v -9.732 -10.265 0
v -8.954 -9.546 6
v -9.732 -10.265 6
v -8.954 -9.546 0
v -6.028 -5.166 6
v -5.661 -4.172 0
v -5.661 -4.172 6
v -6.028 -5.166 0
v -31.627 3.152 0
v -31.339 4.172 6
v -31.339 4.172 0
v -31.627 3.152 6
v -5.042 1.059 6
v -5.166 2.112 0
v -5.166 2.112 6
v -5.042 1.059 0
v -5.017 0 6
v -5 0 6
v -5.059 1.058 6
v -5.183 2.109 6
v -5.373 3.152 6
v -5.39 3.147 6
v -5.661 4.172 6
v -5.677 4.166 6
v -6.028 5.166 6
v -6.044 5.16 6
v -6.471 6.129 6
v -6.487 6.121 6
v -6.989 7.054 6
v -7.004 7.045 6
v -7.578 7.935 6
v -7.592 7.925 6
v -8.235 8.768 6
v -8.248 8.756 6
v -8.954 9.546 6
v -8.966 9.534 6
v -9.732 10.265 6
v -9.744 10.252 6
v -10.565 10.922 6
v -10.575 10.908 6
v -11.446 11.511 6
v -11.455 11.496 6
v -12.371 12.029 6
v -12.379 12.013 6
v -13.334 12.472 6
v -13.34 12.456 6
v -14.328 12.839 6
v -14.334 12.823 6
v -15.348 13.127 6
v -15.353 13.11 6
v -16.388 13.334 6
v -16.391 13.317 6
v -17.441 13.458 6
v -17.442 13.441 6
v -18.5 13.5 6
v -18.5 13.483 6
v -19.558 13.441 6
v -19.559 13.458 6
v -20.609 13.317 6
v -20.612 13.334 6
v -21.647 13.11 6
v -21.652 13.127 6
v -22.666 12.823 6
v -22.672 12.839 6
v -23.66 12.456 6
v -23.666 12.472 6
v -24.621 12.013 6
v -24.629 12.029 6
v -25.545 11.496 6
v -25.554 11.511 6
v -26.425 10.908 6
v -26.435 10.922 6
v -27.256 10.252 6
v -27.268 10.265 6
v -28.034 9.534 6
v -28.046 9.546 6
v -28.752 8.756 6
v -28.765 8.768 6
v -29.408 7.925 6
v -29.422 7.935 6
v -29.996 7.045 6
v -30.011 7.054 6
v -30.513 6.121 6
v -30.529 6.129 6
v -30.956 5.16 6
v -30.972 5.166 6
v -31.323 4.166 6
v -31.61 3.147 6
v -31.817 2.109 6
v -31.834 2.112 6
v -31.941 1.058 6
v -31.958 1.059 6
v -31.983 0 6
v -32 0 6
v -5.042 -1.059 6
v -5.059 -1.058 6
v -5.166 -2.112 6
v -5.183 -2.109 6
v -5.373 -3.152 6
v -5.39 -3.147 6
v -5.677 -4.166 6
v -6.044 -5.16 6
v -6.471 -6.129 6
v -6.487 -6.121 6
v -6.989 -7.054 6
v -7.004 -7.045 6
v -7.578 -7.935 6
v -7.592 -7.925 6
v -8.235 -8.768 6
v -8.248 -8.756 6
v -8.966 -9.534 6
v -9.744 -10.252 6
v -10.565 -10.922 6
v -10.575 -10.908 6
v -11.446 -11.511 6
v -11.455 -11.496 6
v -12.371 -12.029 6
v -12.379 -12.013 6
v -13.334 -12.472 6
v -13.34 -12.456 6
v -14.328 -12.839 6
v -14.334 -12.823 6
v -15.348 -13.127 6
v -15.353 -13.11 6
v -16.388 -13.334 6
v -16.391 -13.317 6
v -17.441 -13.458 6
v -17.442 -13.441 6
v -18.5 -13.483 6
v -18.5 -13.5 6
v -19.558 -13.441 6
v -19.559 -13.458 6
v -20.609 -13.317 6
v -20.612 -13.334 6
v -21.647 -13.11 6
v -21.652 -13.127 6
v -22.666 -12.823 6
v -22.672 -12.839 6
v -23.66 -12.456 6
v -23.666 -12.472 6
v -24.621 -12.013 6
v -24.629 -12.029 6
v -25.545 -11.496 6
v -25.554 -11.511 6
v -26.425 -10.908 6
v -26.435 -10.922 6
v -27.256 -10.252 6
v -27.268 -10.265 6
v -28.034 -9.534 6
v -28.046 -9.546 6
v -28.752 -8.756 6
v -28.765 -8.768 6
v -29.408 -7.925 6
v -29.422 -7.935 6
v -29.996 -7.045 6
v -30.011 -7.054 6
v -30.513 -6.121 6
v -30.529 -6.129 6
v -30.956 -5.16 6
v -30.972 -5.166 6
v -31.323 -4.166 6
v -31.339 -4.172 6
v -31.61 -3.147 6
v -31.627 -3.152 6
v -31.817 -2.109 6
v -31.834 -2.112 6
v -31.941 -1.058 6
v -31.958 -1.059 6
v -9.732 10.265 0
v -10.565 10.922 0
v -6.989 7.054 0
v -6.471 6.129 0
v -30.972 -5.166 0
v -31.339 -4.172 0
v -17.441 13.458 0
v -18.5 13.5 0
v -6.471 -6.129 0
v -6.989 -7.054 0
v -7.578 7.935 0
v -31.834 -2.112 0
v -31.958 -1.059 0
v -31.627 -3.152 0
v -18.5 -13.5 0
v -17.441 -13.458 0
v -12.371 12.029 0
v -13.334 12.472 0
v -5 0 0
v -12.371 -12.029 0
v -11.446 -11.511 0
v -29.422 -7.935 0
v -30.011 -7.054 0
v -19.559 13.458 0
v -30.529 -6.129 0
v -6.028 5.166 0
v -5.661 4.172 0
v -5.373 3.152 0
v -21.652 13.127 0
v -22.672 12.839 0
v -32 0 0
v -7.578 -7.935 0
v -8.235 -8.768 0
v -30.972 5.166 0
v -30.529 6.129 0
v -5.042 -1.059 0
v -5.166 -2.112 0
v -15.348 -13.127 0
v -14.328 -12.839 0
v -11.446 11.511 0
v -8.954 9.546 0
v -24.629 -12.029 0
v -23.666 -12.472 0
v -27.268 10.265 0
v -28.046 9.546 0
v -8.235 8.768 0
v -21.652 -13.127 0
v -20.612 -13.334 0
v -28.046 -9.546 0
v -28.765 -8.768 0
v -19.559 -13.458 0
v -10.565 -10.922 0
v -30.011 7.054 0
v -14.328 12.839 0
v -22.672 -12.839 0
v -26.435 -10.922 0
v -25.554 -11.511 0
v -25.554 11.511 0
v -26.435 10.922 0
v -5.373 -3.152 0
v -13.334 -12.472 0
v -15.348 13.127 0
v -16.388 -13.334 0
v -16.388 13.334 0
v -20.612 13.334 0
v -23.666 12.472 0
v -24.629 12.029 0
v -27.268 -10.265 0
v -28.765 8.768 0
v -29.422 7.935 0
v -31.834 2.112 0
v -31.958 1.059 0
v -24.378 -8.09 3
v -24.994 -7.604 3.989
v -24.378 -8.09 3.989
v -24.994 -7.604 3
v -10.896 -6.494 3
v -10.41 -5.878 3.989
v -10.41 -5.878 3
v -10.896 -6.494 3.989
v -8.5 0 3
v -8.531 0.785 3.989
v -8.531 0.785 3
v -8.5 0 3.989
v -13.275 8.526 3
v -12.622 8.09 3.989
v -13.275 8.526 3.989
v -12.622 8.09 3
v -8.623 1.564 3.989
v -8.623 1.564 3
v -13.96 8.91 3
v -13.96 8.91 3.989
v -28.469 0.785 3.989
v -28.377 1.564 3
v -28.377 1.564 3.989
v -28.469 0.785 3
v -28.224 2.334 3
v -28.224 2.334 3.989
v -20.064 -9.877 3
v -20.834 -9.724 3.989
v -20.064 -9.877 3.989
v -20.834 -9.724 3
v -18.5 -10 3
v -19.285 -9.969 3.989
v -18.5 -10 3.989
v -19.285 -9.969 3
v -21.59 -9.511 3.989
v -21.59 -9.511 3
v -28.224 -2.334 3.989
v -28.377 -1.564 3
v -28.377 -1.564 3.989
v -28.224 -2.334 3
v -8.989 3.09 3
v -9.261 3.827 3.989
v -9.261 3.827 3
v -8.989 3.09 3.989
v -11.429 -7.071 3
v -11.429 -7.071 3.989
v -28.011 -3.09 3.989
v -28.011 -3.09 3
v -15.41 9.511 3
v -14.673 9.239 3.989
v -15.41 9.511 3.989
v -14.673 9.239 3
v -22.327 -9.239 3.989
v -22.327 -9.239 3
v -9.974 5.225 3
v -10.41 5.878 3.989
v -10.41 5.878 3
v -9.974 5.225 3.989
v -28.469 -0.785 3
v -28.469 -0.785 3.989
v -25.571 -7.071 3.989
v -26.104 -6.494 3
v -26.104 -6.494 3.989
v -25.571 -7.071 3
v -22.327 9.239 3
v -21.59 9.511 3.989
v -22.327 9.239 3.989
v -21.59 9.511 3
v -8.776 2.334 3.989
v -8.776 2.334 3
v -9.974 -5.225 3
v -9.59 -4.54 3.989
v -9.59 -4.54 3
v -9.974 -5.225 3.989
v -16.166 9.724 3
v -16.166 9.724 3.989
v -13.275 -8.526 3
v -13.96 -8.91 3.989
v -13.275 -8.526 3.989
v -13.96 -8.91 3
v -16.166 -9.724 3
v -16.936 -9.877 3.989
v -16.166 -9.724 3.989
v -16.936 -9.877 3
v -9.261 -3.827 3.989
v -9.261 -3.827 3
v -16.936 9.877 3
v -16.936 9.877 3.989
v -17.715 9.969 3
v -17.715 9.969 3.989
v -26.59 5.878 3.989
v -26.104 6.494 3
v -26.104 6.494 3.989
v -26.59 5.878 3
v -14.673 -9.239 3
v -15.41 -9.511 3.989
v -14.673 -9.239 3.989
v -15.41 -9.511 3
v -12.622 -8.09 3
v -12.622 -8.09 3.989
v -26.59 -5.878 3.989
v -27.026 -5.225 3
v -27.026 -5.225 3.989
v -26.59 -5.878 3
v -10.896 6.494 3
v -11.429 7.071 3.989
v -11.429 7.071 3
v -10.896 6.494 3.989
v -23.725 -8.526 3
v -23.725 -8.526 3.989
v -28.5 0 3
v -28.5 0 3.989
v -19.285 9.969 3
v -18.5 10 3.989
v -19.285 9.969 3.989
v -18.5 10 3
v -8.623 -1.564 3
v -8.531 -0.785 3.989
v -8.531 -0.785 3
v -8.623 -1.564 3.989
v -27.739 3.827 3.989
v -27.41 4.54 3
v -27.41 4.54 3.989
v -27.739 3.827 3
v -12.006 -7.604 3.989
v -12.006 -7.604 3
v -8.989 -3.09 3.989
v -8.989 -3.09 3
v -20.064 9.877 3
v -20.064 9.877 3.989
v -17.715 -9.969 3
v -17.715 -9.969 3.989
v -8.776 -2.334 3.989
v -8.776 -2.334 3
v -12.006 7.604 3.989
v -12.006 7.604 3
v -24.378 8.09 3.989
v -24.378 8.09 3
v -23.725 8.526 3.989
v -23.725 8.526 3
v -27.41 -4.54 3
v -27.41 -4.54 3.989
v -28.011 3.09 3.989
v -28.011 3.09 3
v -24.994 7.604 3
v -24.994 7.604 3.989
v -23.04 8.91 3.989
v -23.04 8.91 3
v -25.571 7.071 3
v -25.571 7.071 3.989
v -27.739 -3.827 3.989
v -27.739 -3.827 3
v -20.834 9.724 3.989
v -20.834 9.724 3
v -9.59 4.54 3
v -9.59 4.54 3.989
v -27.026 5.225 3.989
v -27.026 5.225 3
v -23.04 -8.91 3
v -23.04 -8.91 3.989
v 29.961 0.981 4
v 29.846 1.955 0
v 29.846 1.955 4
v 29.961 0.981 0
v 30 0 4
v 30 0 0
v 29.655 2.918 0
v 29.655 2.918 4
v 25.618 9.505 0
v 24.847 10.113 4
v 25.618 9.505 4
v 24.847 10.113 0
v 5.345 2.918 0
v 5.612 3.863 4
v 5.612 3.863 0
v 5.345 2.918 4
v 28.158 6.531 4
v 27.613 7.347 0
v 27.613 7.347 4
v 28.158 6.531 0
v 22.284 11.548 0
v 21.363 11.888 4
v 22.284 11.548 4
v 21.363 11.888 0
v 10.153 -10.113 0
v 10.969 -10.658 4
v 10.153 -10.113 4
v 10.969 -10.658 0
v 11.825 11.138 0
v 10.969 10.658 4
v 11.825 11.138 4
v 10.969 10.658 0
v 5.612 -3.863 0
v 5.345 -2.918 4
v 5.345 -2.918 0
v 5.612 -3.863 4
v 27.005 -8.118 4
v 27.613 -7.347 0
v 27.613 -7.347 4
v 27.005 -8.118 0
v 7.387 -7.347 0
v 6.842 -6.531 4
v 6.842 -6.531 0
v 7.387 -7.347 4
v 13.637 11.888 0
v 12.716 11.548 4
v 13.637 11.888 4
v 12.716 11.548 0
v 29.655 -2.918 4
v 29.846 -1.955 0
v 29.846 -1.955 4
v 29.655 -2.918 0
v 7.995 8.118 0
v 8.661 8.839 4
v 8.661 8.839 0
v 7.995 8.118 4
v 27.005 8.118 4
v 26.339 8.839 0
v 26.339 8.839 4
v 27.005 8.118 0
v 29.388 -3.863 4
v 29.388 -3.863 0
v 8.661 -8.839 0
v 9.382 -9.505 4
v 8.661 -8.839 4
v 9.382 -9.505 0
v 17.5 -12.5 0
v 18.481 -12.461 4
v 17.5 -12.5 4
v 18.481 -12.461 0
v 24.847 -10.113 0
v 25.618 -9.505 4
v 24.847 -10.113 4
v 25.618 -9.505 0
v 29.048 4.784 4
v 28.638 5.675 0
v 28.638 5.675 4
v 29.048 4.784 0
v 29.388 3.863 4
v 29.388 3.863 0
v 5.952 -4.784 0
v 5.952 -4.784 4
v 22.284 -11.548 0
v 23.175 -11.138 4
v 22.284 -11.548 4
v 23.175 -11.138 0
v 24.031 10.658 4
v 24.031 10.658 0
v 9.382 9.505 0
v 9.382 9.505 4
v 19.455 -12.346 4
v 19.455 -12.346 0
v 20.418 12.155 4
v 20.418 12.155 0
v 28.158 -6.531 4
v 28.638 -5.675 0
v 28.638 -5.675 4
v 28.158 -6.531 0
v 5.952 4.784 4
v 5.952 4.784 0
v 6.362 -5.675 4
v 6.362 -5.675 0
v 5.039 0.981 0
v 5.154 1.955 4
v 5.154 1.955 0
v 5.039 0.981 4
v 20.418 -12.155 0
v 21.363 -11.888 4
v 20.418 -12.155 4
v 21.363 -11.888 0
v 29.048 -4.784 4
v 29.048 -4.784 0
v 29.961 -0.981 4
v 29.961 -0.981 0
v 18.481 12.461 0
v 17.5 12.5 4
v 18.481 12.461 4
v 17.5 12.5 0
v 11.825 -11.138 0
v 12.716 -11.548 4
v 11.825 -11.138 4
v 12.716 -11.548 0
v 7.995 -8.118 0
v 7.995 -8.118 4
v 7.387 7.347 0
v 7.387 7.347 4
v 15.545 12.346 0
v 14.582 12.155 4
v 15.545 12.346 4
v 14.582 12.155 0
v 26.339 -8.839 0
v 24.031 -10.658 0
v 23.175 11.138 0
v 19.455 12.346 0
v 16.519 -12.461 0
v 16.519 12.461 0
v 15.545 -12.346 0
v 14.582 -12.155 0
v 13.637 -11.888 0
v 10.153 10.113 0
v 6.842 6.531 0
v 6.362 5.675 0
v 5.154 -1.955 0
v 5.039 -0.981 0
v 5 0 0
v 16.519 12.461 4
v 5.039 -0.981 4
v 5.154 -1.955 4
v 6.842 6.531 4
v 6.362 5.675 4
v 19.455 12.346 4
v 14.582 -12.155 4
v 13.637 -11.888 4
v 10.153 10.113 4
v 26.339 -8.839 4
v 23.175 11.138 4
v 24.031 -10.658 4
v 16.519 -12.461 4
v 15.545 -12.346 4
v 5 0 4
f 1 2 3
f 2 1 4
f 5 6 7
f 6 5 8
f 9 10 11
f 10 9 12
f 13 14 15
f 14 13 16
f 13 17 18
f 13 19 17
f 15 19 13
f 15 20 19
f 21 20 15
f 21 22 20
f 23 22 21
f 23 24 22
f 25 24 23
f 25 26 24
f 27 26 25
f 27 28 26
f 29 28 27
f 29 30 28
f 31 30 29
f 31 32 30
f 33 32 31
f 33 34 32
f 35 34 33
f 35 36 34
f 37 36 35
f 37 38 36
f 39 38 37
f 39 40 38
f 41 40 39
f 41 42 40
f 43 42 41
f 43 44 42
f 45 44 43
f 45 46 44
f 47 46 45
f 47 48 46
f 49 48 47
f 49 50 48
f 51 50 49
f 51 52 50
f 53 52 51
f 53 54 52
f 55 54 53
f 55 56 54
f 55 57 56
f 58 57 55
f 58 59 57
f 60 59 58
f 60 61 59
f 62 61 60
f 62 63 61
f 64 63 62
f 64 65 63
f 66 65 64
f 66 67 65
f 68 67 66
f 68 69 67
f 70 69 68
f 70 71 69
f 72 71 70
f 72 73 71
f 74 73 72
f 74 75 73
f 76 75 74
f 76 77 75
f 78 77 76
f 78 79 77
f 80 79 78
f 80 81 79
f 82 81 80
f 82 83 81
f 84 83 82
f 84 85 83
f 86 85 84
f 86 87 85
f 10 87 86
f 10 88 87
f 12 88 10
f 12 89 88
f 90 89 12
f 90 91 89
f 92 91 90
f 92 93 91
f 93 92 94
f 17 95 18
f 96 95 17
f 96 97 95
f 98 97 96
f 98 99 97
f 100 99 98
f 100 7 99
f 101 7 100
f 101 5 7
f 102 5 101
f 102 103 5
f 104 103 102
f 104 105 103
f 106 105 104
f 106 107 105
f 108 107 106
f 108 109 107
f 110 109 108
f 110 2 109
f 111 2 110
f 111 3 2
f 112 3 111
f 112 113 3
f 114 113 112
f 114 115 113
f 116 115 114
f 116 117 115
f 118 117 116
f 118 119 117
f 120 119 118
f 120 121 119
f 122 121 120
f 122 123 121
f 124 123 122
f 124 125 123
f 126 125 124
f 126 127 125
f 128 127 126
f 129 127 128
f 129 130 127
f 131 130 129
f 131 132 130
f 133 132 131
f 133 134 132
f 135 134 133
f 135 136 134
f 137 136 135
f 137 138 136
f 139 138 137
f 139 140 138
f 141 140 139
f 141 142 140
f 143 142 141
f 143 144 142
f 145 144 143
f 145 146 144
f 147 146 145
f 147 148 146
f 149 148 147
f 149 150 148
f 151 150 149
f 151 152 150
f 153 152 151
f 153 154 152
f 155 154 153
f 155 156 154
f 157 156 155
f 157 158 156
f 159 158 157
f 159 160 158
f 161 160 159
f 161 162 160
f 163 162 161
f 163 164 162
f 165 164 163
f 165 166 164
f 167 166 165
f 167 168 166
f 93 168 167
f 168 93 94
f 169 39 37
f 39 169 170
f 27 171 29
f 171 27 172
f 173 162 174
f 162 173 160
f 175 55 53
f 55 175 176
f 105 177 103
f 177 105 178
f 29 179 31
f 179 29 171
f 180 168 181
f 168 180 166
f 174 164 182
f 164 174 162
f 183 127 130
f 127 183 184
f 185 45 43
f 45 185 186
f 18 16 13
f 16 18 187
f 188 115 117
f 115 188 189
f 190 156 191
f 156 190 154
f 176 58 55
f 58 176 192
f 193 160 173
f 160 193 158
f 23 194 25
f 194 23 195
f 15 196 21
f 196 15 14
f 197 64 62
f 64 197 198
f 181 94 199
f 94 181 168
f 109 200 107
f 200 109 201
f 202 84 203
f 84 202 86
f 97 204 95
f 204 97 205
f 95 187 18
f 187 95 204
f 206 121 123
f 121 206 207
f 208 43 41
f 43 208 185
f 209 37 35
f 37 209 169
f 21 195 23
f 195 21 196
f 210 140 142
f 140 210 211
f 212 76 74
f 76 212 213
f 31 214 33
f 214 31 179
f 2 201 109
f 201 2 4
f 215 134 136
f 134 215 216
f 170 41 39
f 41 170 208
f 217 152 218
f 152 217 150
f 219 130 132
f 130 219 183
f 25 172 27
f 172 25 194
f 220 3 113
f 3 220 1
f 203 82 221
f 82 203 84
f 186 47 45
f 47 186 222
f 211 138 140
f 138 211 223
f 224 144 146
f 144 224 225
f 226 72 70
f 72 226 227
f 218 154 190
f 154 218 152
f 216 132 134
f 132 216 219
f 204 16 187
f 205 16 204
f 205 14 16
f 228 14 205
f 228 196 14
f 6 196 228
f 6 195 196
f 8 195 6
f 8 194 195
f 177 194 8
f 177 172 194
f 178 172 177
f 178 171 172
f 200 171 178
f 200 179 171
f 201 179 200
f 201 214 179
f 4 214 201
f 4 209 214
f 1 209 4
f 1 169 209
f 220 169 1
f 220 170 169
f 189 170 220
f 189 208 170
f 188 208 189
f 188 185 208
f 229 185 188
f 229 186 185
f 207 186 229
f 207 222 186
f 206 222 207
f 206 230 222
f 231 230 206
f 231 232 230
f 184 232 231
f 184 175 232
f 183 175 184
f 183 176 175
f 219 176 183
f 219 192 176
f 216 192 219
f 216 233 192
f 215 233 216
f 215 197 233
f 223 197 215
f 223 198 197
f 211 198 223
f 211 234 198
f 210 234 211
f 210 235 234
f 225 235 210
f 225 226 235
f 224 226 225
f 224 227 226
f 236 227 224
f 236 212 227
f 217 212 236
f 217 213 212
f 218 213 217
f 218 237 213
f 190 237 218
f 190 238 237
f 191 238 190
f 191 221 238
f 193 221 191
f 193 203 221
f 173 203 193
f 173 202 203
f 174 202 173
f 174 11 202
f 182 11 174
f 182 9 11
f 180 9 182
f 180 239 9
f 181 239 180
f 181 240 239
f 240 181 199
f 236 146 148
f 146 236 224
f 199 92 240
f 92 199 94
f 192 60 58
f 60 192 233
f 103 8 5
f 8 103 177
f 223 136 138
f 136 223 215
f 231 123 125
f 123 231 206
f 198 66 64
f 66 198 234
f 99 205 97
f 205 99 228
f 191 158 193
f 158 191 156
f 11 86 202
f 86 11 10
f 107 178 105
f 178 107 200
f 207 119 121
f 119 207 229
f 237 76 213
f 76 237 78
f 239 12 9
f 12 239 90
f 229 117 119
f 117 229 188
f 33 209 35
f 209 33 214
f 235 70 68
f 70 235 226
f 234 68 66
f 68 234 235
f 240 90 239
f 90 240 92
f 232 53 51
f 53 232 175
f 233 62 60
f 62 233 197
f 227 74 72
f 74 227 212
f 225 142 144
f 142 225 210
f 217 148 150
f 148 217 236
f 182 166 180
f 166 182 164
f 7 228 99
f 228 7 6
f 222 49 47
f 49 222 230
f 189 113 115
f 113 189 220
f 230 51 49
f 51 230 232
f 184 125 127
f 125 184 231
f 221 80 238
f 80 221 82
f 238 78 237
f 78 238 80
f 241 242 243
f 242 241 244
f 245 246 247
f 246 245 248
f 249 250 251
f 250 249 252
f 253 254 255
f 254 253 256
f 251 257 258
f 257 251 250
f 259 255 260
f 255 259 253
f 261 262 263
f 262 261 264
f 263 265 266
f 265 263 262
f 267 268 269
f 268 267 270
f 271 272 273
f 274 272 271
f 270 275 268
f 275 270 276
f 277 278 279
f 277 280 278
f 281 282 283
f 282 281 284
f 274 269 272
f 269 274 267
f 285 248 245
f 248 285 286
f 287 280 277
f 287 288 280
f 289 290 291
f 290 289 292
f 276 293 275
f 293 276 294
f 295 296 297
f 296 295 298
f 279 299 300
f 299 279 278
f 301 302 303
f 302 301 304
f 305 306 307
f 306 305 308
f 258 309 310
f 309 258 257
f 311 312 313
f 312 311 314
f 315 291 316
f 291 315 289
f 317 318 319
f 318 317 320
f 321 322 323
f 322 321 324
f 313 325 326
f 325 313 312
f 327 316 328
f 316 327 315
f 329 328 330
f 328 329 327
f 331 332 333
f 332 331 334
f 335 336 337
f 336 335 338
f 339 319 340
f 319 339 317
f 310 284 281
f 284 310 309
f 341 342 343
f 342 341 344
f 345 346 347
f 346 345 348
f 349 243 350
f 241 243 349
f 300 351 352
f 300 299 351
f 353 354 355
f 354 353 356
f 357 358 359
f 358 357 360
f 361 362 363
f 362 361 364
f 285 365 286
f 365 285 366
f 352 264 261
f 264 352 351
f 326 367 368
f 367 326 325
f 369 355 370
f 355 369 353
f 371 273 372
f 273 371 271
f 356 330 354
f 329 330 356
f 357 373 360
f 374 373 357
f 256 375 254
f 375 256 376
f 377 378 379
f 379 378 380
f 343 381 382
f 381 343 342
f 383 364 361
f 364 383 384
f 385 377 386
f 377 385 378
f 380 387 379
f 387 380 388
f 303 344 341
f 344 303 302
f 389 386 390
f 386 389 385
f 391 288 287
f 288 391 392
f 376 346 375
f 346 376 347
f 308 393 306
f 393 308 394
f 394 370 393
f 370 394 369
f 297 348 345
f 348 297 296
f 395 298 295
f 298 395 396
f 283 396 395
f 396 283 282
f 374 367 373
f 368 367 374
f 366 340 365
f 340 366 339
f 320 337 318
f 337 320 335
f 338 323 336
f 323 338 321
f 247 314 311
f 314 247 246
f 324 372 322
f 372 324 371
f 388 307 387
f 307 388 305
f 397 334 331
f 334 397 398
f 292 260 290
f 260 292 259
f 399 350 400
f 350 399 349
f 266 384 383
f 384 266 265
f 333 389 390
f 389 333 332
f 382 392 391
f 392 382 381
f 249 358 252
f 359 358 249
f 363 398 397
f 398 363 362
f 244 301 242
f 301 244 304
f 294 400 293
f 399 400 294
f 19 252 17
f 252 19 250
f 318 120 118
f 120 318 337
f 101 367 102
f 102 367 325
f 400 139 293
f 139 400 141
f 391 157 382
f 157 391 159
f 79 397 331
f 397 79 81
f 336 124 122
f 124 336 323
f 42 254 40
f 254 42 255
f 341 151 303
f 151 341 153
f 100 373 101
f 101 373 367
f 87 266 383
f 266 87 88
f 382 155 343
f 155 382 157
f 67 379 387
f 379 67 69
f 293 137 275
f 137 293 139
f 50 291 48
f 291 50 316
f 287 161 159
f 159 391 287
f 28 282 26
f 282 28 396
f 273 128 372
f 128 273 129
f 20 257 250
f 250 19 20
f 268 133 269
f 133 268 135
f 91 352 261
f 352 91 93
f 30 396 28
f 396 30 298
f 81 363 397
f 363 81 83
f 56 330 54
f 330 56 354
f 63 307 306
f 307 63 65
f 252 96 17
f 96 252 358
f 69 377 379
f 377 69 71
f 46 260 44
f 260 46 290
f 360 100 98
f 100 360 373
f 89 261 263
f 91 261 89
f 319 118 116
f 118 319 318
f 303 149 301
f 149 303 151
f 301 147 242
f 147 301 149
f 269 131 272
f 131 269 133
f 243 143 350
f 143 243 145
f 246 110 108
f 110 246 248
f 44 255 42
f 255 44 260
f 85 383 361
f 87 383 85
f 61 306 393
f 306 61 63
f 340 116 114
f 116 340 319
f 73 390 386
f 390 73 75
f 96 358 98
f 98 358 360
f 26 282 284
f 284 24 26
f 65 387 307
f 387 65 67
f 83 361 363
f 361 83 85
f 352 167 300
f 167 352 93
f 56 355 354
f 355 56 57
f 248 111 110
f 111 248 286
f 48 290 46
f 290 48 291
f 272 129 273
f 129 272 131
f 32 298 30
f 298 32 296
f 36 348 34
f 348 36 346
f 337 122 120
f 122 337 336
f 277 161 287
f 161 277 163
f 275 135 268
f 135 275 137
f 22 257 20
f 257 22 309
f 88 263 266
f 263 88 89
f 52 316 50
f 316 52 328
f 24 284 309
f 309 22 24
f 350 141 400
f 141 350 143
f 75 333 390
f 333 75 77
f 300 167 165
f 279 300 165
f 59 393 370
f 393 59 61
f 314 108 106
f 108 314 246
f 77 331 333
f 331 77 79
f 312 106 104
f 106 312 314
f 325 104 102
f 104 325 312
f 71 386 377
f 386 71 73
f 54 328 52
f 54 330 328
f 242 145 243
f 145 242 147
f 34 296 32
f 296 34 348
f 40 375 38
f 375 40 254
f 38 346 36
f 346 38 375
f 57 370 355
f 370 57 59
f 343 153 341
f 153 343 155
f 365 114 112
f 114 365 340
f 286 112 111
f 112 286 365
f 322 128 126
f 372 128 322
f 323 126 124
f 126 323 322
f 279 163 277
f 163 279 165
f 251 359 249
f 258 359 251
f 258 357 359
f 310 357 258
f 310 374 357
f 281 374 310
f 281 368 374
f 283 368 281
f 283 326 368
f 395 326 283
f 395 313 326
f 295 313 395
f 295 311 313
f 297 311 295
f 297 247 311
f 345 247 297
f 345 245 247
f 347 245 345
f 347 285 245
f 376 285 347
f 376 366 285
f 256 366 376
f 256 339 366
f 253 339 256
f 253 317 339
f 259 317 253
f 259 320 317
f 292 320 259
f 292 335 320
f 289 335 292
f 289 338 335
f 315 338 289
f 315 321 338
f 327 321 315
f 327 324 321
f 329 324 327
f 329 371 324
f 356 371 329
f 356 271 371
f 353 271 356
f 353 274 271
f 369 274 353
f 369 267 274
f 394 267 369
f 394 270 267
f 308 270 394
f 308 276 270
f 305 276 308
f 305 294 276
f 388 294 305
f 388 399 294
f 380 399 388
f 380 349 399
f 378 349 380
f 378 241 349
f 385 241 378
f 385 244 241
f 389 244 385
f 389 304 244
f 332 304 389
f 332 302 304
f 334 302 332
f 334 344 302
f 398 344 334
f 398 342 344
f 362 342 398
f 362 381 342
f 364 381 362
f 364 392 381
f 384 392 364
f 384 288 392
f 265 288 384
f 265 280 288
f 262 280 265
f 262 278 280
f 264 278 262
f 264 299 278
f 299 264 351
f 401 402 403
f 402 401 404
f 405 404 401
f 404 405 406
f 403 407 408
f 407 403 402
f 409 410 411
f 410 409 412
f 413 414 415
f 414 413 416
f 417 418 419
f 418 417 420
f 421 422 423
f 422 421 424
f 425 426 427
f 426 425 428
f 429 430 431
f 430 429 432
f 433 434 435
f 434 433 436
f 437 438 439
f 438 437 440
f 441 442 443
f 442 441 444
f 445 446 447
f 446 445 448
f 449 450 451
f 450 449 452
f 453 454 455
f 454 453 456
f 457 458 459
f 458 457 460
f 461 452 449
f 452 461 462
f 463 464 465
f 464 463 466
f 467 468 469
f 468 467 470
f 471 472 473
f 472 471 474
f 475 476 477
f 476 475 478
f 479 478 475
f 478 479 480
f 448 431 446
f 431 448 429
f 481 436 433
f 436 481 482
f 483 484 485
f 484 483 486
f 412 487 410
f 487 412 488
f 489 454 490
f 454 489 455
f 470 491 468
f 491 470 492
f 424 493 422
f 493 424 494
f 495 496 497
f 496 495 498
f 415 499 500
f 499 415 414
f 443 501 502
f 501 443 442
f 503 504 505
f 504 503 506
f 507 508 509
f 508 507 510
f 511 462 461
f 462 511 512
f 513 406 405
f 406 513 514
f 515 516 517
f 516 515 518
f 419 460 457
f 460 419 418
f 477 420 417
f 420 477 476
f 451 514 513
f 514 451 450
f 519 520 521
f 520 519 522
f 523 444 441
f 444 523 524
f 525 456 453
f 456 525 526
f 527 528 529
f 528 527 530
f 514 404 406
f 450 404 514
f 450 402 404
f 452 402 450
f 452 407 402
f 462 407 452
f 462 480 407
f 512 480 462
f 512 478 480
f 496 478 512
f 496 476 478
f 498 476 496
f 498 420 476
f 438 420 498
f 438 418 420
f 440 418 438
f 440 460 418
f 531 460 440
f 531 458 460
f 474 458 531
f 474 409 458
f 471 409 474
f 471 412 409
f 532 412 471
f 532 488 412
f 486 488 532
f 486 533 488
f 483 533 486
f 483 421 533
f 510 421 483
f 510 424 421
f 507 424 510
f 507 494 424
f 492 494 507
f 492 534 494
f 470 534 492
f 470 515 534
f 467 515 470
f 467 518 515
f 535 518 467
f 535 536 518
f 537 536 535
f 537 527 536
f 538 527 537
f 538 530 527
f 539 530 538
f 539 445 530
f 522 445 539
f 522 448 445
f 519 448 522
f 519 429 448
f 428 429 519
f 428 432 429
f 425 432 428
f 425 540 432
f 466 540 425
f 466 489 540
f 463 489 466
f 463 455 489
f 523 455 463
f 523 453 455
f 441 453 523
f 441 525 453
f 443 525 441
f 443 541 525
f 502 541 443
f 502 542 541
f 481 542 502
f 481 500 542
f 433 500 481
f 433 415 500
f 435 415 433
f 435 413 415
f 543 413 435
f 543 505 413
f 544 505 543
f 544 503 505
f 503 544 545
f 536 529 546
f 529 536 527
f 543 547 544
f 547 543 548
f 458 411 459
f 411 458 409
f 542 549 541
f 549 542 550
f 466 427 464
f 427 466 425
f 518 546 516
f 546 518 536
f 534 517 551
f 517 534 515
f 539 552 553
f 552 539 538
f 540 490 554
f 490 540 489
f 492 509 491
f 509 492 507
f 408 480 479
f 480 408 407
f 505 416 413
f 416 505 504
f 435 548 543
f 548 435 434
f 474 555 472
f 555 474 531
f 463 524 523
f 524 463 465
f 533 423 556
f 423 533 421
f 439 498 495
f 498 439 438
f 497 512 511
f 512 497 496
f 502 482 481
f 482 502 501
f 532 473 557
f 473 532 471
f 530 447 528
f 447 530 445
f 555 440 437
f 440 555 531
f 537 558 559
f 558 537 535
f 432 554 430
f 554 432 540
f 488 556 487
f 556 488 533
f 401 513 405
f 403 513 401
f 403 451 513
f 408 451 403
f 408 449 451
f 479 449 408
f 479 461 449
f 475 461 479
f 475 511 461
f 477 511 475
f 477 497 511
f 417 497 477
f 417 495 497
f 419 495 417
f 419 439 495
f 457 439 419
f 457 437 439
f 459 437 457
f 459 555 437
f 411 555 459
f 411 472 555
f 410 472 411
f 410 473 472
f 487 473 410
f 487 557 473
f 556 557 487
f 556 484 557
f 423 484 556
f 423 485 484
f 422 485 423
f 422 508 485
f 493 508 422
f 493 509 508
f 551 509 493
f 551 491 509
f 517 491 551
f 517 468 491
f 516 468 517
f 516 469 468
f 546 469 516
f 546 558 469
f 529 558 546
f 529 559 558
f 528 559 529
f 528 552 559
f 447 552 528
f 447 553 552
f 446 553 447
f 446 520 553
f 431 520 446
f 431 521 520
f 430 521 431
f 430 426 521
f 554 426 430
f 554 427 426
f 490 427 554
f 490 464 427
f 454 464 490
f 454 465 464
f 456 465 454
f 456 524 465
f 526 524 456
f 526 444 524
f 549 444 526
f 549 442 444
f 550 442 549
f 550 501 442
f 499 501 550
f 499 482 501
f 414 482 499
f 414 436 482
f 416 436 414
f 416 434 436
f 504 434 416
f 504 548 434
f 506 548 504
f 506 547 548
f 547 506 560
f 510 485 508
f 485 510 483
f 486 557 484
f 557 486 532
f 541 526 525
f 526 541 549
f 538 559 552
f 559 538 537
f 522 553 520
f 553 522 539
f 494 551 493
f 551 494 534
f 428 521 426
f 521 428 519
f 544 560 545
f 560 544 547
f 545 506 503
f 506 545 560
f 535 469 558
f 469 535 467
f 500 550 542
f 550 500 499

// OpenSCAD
/*
 * =====================================
 *   This is public Domain Code
 *   Contributed by: Gael Lafond
 *   24 January 2018
 * =====================================
 *
 * Press Watch
 * Intended to be used with a vice
 * or a large locking pliers (vice grip).
 *
 * Inspired from:
 *     https://www.thingiverse.com/thing:2943455
 *
 * Unit: millimetres.
 */

$fn = 80;

view = "Both"; // [Both, Face, Back]

/* [Face] */
face_dia = 27;
face_hole_depth = 3;
face_hole_chamfer_angle = 30;
face_crystal_dia = 20; // with generous clearance

/* [Back] */
back_dia = 25;

/* [Advanced] */
back_thickness = 4;
face_bottom_thickness = 3;

/* [Hidden] */
face_thickness = face_hole_depth + face_bottom_thickness;



if (view == "Face") {
	face();
} else if (view == "Back") {
	back();
} else {
	translate([-(face_dia/2 + 5), 0, 0]) face();
	translate([back_dia/2 + 5, 0, 0]) back();
}



module back() {
	cylinder(d = back_dia, h = back_thickness);
}

module face() {
	difference() {
		cylinder(d = face_dia, h = face_thickness);
		cylinder(d = face_crystal_dia, h = face_thickness);

		// Chamfer
		chamfer_height = tan(face_hole_chamfer_angle) * face_dia/2;
		translate([0, 0, face_thickness - chamfer_height + 0.01]) {
			cylinder(d1 = 0, d2 = face_dia, h = chamfer_height);
		}
	}

	// Add bottom
	cylinder(d = face_dia, h = face_bottom_thickness);
}
